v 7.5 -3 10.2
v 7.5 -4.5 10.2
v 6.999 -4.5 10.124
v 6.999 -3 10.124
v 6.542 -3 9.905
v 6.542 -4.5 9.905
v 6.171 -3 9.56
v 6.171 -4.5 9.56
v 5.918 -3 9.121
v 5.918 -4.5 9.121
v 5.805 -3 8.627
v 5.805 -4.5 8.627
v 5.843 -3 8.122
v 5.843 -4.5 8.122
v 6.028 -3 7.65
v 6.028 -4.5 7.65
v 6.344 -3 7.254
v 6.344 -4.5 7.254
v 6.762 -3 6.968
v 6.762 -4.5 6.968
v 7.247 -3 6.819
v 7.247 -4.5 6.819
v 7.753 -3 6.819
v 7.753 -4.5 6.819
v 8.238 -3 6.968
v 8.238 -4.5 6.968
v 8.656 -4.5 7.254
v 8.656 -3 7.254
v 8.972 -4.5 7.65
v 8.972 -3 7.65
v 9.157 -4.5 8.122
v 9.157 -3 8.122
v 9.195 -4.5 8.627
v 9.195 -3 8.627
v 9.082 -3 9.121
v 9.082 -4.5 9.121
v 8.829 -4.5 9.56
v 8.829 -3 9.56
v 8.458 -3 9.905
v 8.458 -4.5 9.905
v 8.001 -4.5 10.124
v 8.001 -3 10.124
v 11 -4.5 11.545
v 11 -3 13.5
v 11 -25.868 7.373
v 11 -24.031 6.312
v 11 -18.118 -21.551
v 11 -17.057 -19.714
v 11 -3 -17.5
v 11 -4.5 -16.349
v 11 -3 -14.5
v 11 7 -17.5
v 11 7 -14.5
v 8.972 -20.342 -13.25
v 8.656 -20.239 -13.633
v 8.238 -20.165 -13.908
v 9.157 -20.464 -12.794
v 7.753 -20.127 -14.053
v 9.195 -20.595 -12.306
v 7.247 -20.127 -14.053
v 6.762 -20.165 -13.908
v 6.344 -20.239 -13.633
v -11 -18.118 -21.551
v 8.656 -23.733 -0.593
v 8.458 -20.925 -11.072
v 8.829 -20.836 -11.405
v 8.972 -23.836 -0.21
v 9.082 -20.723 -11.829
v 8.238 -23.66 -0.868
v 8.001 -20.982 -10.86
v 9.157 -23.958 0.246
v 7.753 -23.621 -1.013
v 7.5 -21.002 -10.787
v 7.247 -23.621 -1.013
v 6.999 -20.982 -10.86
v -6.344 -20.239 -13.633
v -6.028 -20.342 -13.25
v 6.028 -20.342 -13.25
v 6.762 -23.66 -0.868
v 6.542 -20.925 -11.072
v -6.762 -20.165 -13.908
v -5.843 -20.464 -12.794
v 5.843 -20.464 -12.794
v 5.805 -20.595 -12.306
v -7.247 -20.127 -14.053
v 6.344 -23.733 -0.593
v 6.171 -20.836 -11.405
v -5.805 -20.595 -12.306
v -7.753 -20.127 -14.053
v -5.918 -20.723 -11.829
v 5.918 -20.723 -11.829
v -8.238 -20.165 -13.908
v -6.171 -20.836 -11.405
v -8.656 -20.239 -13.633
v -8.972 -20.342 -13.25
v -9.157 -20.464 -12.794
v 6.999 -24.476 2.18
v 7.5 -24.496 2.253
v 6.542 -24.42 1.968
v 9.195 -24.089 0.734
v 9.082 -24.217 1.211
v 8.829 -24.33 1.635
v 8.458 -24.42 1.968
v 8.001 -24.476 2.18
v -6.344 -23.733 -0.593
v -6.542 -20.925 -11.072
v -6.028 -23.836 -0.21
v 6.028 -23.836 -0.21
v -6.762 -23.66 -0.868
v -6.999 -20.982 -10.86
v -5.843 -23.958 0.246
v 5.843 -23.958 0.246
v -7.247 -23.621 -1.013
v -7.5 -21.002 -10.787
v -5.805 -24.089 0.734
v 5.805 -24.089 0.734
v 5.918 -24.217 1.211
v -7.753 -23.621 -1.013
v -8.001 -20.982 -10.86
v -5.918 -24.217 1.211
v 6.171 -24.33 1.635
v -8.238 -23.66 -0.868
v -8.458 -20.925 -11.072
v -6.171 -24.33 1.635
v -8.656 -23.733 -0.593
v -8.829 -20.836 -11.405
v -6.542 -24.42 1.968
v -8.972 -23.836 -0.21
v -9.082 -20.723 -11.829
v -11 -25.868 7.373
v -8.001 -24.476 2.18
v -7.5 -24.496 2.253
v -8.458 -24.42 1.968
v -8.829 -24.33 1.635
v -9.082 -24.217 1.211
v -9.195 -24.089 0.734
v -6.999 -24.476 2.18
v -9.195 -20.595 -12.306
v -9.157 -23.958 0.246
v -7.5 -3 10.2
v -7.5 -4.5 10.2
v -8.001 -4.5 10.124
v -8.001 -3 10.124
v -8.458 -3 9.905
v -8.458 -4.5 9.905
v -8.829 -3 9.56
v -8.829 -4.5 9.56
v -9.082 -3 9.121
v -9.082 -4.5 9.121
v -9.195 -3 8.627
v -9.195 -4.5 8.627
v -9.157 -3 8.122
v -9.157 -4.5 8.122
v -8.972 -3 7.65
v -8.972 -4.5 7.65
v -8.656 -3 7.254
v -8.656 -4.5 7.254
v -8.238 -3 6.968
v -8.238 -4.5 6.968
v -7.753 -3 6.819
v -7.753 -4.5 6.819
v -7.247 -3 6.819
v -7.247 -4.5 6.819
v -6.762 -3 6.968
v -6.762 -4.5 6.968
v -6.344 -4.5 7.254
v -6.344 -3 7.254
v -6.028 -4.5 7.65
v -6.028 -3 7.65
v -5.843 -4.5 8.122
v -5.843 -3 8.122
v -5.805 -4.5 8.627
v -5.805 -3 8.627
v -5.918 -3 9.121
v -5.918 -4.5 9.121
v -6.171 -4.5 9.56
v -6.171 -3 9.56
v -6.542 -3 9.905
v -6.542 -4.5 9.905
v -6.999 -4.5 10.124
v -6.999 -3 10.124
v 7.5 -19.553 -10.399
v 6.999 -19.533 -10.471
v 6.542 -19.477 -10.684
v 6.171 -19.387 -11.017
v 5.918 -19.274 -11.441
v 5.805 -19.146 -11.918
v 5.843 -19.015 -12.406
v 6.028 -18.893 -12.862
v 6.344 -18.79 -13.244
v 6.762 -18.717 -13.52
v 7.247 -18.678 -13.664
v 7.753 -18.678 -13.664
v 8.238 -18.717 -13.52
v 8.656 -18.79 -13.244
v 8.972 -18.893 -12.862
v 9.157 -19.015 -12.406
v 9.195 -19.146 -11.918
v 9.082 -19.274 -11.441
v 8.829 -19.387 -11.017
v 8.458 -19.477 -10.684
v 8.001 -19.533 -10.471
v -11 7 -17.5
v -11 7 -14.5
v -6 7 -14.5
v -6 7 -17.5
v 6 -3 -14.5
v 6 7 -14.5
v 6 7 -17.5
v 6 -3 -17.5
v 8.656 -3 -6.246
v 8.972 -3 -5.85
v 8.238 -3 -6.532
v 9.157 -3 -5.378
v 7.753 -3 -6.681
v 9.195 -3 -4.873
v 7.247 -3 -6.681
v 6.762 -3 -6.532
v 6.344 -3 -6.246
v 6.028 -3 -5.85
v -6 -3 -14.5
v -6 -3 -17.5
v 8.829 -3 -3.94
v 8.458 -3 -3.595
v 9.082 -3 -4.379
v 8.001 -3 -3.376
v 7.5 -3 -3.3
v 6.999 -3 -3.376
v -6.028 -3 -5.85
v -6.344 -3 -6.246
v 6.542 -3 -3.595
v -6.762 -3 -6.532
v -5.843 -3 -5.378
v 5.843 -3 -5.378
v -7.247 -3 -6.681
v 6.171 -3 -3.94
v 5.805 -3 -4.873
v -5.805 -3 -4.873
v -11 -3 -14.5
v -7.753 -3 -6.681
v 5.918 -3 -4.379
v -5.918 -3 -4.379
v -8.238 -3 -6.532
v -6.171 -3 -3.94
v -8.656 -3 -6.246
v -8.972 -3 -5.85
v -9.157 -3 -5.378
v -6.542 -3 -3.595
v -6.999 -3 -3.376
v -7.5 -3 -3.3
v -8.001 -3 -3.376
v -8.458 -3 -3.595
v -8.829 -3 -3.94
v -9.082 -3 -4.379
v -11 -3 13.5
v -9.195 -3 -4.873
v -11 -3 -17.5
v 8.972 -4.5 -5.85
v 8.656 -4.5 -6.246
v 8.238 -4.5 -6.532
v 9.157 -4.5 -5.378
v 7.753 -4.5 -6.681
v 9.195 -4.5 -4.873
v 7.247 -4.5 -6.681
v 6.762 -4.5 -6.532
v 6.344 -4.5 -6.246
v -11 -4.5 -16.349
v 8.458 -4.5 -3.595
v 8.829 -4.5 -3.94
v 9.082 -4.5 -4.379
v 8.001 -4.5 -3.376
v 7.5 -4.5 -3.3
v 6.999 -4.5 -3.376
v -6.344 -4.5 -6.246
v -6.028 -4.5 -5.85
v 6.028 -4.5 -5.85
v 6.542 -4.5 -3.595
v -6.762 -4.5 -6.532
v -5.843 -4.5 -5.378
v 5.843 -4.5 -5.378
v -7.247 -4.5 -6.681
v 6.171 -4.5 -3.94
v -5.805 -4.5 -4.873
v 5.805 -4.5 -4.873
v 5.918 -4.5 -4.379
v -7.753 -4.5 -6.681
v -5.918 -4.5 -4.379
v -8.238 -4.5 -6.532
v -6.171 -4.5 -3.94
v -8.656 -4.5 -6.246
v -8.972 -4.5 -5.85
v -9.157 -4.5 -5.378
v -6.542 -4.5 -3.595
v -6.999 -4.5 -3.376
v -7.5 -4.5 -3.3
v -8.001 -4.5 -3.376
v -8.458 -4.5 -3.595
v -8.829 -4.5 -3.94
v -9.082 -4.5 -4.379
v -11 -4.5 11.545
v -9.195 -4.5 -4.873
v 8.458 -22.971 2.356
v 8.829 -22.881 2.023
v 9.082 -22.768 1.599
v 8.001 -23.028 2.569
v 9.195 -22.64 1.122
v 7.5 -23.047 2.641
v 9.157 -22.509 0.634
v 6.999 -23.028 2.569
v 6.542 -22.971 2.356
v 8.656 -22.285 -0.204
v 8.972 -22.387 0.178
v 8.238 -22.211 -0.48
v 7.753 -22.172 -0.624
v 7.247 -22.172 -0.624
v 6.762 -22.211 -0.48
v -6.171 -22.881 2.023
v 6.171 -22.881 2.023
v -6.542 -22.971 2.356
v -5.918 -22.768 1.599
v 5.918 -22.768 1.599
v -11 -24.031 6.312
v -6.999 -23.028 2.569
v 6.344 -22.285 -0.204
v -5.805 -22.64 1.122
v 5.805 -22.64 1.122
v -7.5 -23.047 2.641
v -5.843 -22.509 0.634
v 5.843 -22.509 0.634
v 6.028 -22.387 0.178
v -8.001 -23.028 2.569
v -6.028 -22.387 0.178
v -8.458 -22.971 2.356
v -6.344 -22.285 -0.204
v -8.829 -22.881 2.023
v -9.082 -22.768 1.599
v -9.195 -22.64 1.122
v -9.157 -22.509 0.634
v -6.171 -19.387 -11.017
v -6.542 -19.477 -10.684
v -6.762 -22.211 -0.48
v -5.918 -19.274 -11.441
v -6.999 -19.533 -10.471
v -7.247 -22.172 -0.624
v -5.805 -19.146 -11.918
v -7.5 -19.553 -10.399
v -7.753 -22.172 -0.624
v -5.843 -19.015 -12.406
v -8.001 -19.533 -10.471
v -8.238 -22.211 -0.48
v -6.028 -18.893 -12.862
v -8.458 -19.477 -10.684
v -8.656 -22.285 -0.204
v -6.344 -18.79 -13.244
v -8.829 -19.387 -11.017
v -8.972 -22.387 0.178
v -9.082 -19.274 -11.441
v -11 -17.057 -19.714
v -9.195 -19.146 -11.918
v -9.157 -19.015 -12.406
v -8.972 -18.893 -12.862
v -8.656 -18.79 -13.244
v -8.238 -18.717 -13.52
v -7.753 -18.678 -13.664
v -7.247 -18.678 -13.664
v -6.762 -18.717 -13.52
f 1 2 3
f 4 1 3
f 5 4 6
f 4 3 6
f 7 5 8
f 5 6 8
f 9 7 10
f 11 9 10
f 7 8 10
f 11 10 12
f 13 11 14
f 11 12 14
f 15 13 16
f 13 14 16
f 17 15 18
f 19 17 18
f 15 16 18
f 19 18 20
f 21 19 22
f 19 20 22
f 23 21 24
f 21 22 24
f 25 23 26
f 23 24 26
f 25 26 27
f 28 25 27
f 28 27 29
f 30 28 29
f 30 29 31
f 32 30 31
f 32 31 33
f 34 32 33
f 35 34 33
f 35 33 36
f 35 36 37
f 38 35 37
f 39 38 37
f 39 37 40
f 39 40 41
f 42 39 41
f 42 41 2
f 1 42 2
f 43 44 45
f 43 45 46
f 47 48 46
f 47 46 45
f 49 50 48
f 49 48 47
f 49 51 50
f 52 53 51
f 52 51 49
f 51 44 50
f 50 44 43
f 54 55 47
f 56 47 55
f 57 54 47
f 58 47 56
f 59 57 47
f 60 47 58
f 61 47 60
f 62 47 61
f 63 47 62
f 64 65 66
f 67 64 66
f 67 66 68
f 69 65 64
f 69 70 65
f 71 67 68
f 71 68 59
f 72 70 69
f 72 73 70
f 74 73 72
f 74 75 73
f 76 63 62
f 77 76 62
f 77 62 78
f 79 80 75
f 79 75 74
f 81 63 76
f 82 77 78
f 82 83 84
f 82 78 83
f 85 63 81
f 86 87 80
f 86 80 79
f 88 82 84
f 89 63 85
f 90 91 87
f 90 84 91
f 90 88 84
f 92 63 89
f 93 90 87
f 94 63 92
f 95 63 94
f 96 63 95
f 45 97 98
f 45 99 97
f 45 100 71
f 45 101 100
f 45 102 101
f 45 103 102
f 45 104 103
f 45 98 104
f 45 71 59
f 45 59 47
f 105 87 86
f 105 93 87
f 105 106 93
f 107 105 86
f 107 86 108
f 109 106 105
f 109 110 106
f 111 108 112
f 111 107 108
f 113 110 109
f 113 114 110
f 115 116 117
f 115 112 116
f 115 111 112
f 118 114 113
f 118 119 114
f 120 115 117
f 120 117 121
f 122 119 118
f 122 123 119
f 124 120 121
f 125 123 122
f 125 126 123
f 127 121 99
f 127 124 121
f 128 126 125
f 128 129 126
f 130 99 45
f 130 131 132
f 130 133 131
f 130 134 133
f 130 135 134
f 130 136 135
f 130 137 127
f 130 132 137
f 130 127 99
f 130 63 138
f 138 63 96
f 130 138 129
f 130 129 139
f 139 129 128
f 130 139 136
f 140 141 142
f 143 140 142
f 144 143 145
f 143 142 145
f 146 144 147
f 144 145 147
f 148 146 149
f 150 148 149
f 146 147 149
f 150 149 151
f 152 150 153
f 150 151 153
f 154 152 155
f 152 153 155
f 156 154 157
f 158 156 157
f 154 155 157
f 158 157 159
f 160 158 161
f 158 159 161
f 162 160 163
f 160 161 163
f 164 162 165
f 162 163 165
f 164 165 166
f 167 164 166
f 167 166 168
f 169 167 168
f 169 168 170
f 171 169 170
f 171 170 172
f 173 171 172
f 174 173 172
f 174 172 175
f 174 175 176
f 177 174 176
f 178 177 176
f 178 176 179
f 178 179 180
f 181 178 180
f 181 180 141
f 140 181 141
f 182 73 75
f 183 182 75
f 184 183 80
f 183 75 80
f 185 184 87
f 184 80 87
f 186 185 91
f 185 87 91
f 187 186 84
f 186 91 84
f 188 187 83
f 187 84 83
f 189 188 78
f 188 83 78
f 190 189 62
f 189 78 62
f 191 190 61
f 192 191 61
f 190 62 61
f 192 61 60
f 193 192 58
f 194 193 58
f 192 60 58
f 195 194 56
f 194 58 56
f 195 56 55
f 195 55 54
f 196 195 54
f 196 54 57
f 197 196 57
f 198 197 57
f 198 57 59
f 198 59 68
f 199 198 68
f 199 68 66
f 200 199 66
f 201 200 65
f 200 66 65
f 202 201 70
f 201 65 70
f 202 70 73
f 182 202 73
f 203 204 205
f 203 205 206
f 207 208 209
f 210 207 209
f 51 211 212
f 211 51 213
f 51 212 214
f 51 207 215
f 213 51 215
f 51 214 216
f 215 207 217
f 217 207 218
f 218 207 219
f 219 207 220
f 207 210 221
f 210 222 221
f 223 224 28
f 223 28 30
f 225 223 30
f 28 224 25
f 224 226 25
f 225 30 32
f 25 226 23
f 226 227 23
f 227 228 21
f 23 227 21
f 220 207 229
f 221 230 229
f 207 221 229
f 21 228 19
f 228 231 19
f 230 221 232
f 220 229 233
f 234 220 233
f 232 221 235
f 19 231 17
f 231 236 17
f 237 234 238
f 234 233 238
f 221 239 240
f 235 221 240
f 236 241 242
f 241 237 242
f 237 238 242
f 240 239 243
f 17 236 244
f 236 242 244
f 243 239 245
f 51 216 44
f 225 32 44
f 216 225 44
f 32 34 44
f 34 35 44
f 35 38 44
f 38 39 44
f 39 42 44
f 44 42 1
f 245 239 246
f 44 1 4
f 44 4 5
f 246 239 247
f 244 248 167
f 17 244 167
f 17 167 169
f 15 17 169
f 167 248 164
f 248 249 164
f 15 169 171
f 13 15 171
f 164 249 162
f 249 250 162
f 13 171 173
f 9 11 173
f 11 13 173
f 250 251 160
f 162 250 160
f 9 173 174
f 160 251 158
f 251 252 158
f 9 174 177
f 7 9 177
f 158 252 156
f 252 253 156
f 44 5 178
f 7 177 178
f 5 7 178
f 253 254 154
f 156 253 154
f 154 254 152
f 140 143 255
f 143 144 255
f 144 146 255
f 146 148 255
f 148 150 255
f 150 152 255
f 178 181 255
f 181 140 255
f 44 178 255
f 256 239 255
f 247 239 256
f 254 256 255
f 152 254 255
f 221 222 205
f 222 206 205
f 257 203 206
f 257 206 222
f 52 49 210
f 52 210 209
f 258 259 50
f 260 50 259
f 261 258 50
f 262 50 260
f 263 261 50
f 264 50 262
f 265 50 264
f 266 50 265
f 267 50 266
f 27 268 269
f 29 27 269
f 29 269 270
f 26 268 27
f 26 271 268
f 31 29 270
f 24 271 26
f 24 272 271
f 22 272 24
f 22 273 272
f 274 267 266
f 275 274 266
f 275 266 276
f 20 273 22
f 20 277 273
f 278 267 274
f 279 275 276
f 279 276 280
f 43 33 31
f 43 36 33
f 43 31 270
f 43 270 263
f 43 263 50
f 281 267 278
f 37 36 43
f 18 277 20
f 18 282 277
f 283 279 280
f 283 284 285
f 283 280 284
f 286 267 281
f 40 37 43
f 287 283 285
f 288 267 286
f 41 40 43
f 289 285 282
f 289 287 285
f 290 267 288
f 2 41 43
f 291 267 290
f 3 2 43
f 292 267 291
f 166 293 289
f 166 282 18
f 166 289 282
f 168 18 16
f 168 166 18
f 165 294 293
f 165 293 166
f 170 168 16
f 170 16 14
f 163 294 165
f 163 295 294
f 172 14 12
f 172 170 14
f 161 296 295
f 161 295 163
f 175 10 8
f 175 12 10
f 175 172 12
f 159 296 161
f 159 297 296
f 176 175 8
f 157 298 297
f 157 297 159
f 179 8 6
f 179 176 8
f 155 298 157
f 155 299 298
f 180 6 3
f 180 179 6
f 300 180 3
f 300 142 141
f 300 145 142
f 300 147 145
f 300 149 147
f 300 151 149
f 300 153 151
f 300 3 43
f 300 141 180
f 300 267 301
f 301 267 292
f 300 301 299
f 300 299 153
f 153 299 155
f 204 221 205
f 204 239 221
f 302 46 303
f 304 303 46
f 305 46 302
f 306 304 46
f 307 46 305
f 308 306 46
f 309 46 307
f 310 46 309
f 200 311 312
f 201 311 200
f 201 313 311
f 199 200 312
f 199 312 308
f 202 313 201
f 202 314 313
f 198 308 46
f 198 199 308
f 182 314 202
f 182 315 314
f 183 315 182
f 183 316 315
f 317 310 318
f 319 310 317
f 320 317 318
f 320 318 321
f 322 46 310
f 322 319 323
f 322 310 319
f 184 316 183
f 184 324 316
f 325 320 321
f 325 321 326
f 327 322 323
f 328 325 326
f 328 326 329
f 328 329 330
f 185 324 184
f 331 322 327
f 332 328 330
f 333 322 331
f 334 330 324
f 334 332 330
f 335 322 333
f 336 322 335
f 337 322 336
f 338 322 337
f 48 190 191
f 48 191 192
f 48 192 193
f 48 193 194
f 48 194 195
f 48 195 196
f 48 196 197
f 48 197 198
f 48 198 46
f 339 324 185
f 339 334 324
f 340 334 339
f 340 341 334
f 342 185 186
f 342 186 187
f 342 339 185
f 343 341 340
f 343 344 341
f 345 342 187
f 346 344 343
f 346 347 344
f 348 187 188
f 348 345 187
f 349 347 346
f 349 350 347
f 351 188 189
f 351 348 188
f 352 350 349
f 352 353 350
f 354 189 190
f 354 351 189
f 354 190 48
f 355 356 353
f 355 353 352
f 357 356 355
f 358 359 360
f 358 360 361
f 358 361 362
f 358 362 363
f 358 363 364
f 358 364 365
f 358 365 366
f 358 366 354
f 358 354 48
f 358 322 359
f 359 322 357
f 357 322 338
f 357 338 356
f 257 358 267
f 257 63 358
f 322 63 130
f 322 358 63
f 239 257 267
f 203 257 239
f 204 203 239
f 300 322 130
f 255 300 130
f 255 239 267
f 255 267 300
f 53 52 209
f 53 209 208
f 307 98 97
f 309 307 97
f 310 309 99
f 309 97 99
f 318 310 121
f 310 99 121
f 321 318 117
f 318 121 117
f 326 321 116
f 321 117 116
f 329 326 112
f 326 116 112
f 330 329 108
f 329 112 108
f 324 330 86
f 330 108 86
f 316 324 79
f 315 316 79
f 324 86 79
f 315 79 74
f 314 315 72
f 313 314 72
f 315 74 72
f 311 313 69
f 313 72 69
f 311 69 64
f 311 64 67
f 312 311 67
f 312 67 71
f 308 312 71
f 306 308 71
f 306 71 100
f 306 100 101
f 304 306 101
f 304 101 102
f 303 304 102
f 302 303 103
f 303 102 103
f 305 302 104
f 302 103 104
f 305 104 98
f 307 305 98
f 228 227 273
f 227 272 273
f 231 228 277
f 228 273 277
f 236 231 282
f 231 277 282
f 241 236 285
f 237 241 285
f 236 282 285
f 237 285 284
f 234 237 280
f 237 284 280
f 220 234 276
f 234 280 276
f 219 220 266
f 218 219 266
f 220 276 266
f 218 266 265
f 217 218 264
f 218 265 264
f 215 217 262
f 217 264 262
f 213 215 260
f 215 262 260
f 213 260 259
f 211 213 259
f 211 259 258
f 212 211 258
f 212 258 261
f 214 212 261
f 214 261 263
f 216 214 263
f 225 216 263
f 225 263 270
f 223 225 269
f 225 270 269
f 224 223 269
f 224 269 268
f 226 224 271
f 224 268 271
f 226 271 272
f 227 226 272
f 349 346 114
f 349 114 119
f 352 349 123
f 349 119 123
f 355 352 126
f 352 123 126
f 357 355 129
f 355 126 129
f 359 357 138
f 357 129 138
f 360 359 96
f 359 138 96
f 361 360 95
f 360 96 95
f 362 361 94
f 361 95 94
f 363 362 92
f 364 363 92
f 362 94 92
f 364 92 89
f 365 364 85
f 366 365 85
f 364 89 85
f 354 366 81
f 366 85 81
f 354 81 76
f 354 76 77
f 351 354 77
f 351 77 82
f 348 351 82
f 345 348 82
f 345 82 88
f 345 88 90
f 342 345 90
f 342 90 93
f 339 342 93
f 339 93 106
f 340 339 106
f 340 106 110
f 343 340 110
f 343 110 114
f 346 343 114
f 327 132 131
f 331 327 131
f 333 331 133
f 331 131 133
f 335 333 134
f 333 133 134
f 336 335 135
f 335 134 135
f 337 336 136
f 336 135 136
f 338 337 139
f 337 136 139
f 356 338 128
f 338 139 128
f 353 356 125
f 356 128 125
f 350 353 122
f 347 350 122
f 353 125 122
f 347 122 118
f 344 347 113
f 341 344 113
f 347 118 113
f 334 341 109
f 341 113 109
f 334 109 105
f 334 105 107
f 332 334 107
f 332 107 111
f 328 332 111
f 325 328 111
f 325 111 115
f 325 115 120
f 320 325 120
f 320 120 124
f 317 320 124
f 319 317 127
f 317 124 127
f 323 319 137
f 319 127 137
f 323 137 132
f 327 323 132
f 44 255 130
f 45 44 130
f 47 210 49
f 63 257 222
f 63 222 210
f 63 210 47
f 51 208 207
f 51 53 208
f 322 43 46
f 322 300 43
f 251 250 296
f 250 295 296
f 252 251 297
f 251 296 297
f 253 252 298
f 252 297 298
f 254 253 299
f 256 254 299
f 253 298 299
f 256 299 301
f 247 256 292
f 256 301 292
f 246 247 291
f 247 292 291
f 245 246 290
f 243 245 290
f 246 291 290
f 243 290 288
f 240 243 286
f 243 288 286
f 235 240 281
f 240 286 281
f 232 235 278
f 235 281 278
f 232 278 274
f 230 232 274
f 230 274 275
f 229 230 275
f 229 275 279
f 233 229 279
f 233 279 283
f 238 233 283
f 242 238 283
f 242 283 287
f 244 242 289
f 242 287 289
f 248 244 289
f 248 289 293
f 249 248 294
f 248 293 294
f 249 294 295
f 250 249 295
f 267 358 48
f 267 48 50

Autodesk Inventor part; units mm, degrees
ref_plane "YZ Plane" through (0, 0, 0) normal (1, 0, 0) x (0, 1, 0)
ref_plane "XZ Plane" through (0, 0, 0) normal (0, 1, 0) x (-1, 0, 0)
ref_plane "XY Plane" through (0, 0, 0) normal (0, 0, 1) x (1, 0, 0)
sketch "Sketch1" plane through (0, 0, 0) normal (0, 1, 0) x (-1, 0, 0)
  line L0 (15, 13.5) -> (15, -13.5)
  line L1 (15, -13.5) -> (-15, -13.5)
  line L2 (-15, -13.5) -> (-15, 13.5)
  line L3 (-15, 13.5) -> (15, 13.5)
  point P0 (0, -13.5)
  point P1 (-15, 0)
  dimension "d2" = 27
  dimension "d3" = 30
extrude "Extrusion1" [suppressed]
sketch "Sketch4" plane through (0, 0, 0) normal (1, 0, 0) x (0, 1, 0)
  line L0 (-18.1177, -21.5508) -> (-25.8677, 7.3726)
  line L1 (0, 13.5) -> (-3, 13.5) projected
  line L2 (-17.057, -19.7137) -> (-4.5, -16.349)
  line L3 (-4.5, 11.5452) -> (-24.0306, 6.312)
  line L4 (-3, -17.5) -> (-3, 13.5)
  line L5 (-24.0306, 6.312) -> (-17.057, -19.7137)
  line L6 (-4.5, -16.349) -> (-4.5, 11.5452)
  line L7 (-3, -13.5) -> (-3, 13.5) projected
  line L8 (-3, 13.5) -> (-25.8677, 7.3726)
  line L9 (-3, -17.5) -> (-18.1177, -21.5508)
  point P0 (0, 0)
  point P1 (-51.8403, 80.9842)
  point P2 (-3, 0)
  point P3 (-3, 0)
  point P4 (-3, 0)
  point P5 (-14.2653, 8.9286)
  point P6 (-10.5588, -19.5254)
  dimension "d50" = 1.5
  dimension "d57" = 1.5
  dimension "d59" = 1.5
  dimension "d60" = 1.5
  dimension "d62" = 4
  dimension "d63" = 15
  dimension "d64" = 13
extrude "Extrusion3" add sketch "Sketch4" along normal mid plane 22
sketch "Sketch5" plane through (11, 0, 0) normal (1, 0, 0) x (0, 0, -1)
  line L0 (17.5, -3) -> (-13.5, -3) projected
  line L1 (14.5, -3) -> (17.5, -3)
  line L2 (17.5, -3) -> (17.5, 7)
  line L3 (17.5, 7) -> (14.5, 7)
  line L4 (14.5, 7) -> (14.5, -3)
  point P0 (0, 0)
  point P1 (13.5, -3)
  dimension "d67" = 3
  dimension "d68" = 10
extrude "Extrusion4" add sketch "Sketch5" against normal blind 5
mirror "Mirror1" about plane through (0, 0, 0) normal (1, 0, 0) of "Extrusion4"
sketch "Sketch6" plane through (0, -3, 0) normal (0, 1, 0) x (1, 0, 0)
  line L0 (15, 13.5) -> (15, -13.5) projected
  line L1 (11, -13.5) -> (-11, -13.5) projected
  line L2 (-11, 13.5) -> (11, 13.5) projected
  point P0 (0, 0)
  point P1 (-7.5, 5)
  point P2 (7.5, 5)
  point P3 (7.5, -8.5)
  point P4 (-7.5, -8.5)
  dimension "d71" = 15
  dimension "d72" = 13.5
  dimension "d73" = 7.5
  dimension "d74" = 5
  dimension "d75" = 8.5
hole "Hole2" at (-7.5, -3, -5) at (7.5, -3, -5) at (7.5, -3, 8.5) at (-7.5, -3, 8.5) direction (0, -1, 0) diameter 3.4 depth 1.5
sketch "Sketch7" plane through (-11, -24.0306, 6.312) normal (0, 0.9659258, 0.258819) x (1, 0, 0)
  line L0 (22, -1.5) -> (0, -1.5) projected
  line L1 (22, -1.5) -> (22, 28.4437) projected
  point P0 (11, 12.3165)
  point P1 (3.5, 19)
  point P2 (18.5, 19)
  point P3 (18.5, 5.5)
  point P4 (3.5, 5.5)
  dimension "d83" = 15
  dimension "d84" = 13.5
  dimension "d88" = 7
  dimension "d89" = 3.5
hole "Hole3" at (-7.5, -22.6071, 0.9994) at (7.5, -22.6071, 0.9994) at (7.5, -19.113, -12.0406) at (-7.5, -19.113, -12.0406) direction (0, -0.9659258, -0.258819) diameter 3.4 depth 1.5
properties part number "Ramp"
